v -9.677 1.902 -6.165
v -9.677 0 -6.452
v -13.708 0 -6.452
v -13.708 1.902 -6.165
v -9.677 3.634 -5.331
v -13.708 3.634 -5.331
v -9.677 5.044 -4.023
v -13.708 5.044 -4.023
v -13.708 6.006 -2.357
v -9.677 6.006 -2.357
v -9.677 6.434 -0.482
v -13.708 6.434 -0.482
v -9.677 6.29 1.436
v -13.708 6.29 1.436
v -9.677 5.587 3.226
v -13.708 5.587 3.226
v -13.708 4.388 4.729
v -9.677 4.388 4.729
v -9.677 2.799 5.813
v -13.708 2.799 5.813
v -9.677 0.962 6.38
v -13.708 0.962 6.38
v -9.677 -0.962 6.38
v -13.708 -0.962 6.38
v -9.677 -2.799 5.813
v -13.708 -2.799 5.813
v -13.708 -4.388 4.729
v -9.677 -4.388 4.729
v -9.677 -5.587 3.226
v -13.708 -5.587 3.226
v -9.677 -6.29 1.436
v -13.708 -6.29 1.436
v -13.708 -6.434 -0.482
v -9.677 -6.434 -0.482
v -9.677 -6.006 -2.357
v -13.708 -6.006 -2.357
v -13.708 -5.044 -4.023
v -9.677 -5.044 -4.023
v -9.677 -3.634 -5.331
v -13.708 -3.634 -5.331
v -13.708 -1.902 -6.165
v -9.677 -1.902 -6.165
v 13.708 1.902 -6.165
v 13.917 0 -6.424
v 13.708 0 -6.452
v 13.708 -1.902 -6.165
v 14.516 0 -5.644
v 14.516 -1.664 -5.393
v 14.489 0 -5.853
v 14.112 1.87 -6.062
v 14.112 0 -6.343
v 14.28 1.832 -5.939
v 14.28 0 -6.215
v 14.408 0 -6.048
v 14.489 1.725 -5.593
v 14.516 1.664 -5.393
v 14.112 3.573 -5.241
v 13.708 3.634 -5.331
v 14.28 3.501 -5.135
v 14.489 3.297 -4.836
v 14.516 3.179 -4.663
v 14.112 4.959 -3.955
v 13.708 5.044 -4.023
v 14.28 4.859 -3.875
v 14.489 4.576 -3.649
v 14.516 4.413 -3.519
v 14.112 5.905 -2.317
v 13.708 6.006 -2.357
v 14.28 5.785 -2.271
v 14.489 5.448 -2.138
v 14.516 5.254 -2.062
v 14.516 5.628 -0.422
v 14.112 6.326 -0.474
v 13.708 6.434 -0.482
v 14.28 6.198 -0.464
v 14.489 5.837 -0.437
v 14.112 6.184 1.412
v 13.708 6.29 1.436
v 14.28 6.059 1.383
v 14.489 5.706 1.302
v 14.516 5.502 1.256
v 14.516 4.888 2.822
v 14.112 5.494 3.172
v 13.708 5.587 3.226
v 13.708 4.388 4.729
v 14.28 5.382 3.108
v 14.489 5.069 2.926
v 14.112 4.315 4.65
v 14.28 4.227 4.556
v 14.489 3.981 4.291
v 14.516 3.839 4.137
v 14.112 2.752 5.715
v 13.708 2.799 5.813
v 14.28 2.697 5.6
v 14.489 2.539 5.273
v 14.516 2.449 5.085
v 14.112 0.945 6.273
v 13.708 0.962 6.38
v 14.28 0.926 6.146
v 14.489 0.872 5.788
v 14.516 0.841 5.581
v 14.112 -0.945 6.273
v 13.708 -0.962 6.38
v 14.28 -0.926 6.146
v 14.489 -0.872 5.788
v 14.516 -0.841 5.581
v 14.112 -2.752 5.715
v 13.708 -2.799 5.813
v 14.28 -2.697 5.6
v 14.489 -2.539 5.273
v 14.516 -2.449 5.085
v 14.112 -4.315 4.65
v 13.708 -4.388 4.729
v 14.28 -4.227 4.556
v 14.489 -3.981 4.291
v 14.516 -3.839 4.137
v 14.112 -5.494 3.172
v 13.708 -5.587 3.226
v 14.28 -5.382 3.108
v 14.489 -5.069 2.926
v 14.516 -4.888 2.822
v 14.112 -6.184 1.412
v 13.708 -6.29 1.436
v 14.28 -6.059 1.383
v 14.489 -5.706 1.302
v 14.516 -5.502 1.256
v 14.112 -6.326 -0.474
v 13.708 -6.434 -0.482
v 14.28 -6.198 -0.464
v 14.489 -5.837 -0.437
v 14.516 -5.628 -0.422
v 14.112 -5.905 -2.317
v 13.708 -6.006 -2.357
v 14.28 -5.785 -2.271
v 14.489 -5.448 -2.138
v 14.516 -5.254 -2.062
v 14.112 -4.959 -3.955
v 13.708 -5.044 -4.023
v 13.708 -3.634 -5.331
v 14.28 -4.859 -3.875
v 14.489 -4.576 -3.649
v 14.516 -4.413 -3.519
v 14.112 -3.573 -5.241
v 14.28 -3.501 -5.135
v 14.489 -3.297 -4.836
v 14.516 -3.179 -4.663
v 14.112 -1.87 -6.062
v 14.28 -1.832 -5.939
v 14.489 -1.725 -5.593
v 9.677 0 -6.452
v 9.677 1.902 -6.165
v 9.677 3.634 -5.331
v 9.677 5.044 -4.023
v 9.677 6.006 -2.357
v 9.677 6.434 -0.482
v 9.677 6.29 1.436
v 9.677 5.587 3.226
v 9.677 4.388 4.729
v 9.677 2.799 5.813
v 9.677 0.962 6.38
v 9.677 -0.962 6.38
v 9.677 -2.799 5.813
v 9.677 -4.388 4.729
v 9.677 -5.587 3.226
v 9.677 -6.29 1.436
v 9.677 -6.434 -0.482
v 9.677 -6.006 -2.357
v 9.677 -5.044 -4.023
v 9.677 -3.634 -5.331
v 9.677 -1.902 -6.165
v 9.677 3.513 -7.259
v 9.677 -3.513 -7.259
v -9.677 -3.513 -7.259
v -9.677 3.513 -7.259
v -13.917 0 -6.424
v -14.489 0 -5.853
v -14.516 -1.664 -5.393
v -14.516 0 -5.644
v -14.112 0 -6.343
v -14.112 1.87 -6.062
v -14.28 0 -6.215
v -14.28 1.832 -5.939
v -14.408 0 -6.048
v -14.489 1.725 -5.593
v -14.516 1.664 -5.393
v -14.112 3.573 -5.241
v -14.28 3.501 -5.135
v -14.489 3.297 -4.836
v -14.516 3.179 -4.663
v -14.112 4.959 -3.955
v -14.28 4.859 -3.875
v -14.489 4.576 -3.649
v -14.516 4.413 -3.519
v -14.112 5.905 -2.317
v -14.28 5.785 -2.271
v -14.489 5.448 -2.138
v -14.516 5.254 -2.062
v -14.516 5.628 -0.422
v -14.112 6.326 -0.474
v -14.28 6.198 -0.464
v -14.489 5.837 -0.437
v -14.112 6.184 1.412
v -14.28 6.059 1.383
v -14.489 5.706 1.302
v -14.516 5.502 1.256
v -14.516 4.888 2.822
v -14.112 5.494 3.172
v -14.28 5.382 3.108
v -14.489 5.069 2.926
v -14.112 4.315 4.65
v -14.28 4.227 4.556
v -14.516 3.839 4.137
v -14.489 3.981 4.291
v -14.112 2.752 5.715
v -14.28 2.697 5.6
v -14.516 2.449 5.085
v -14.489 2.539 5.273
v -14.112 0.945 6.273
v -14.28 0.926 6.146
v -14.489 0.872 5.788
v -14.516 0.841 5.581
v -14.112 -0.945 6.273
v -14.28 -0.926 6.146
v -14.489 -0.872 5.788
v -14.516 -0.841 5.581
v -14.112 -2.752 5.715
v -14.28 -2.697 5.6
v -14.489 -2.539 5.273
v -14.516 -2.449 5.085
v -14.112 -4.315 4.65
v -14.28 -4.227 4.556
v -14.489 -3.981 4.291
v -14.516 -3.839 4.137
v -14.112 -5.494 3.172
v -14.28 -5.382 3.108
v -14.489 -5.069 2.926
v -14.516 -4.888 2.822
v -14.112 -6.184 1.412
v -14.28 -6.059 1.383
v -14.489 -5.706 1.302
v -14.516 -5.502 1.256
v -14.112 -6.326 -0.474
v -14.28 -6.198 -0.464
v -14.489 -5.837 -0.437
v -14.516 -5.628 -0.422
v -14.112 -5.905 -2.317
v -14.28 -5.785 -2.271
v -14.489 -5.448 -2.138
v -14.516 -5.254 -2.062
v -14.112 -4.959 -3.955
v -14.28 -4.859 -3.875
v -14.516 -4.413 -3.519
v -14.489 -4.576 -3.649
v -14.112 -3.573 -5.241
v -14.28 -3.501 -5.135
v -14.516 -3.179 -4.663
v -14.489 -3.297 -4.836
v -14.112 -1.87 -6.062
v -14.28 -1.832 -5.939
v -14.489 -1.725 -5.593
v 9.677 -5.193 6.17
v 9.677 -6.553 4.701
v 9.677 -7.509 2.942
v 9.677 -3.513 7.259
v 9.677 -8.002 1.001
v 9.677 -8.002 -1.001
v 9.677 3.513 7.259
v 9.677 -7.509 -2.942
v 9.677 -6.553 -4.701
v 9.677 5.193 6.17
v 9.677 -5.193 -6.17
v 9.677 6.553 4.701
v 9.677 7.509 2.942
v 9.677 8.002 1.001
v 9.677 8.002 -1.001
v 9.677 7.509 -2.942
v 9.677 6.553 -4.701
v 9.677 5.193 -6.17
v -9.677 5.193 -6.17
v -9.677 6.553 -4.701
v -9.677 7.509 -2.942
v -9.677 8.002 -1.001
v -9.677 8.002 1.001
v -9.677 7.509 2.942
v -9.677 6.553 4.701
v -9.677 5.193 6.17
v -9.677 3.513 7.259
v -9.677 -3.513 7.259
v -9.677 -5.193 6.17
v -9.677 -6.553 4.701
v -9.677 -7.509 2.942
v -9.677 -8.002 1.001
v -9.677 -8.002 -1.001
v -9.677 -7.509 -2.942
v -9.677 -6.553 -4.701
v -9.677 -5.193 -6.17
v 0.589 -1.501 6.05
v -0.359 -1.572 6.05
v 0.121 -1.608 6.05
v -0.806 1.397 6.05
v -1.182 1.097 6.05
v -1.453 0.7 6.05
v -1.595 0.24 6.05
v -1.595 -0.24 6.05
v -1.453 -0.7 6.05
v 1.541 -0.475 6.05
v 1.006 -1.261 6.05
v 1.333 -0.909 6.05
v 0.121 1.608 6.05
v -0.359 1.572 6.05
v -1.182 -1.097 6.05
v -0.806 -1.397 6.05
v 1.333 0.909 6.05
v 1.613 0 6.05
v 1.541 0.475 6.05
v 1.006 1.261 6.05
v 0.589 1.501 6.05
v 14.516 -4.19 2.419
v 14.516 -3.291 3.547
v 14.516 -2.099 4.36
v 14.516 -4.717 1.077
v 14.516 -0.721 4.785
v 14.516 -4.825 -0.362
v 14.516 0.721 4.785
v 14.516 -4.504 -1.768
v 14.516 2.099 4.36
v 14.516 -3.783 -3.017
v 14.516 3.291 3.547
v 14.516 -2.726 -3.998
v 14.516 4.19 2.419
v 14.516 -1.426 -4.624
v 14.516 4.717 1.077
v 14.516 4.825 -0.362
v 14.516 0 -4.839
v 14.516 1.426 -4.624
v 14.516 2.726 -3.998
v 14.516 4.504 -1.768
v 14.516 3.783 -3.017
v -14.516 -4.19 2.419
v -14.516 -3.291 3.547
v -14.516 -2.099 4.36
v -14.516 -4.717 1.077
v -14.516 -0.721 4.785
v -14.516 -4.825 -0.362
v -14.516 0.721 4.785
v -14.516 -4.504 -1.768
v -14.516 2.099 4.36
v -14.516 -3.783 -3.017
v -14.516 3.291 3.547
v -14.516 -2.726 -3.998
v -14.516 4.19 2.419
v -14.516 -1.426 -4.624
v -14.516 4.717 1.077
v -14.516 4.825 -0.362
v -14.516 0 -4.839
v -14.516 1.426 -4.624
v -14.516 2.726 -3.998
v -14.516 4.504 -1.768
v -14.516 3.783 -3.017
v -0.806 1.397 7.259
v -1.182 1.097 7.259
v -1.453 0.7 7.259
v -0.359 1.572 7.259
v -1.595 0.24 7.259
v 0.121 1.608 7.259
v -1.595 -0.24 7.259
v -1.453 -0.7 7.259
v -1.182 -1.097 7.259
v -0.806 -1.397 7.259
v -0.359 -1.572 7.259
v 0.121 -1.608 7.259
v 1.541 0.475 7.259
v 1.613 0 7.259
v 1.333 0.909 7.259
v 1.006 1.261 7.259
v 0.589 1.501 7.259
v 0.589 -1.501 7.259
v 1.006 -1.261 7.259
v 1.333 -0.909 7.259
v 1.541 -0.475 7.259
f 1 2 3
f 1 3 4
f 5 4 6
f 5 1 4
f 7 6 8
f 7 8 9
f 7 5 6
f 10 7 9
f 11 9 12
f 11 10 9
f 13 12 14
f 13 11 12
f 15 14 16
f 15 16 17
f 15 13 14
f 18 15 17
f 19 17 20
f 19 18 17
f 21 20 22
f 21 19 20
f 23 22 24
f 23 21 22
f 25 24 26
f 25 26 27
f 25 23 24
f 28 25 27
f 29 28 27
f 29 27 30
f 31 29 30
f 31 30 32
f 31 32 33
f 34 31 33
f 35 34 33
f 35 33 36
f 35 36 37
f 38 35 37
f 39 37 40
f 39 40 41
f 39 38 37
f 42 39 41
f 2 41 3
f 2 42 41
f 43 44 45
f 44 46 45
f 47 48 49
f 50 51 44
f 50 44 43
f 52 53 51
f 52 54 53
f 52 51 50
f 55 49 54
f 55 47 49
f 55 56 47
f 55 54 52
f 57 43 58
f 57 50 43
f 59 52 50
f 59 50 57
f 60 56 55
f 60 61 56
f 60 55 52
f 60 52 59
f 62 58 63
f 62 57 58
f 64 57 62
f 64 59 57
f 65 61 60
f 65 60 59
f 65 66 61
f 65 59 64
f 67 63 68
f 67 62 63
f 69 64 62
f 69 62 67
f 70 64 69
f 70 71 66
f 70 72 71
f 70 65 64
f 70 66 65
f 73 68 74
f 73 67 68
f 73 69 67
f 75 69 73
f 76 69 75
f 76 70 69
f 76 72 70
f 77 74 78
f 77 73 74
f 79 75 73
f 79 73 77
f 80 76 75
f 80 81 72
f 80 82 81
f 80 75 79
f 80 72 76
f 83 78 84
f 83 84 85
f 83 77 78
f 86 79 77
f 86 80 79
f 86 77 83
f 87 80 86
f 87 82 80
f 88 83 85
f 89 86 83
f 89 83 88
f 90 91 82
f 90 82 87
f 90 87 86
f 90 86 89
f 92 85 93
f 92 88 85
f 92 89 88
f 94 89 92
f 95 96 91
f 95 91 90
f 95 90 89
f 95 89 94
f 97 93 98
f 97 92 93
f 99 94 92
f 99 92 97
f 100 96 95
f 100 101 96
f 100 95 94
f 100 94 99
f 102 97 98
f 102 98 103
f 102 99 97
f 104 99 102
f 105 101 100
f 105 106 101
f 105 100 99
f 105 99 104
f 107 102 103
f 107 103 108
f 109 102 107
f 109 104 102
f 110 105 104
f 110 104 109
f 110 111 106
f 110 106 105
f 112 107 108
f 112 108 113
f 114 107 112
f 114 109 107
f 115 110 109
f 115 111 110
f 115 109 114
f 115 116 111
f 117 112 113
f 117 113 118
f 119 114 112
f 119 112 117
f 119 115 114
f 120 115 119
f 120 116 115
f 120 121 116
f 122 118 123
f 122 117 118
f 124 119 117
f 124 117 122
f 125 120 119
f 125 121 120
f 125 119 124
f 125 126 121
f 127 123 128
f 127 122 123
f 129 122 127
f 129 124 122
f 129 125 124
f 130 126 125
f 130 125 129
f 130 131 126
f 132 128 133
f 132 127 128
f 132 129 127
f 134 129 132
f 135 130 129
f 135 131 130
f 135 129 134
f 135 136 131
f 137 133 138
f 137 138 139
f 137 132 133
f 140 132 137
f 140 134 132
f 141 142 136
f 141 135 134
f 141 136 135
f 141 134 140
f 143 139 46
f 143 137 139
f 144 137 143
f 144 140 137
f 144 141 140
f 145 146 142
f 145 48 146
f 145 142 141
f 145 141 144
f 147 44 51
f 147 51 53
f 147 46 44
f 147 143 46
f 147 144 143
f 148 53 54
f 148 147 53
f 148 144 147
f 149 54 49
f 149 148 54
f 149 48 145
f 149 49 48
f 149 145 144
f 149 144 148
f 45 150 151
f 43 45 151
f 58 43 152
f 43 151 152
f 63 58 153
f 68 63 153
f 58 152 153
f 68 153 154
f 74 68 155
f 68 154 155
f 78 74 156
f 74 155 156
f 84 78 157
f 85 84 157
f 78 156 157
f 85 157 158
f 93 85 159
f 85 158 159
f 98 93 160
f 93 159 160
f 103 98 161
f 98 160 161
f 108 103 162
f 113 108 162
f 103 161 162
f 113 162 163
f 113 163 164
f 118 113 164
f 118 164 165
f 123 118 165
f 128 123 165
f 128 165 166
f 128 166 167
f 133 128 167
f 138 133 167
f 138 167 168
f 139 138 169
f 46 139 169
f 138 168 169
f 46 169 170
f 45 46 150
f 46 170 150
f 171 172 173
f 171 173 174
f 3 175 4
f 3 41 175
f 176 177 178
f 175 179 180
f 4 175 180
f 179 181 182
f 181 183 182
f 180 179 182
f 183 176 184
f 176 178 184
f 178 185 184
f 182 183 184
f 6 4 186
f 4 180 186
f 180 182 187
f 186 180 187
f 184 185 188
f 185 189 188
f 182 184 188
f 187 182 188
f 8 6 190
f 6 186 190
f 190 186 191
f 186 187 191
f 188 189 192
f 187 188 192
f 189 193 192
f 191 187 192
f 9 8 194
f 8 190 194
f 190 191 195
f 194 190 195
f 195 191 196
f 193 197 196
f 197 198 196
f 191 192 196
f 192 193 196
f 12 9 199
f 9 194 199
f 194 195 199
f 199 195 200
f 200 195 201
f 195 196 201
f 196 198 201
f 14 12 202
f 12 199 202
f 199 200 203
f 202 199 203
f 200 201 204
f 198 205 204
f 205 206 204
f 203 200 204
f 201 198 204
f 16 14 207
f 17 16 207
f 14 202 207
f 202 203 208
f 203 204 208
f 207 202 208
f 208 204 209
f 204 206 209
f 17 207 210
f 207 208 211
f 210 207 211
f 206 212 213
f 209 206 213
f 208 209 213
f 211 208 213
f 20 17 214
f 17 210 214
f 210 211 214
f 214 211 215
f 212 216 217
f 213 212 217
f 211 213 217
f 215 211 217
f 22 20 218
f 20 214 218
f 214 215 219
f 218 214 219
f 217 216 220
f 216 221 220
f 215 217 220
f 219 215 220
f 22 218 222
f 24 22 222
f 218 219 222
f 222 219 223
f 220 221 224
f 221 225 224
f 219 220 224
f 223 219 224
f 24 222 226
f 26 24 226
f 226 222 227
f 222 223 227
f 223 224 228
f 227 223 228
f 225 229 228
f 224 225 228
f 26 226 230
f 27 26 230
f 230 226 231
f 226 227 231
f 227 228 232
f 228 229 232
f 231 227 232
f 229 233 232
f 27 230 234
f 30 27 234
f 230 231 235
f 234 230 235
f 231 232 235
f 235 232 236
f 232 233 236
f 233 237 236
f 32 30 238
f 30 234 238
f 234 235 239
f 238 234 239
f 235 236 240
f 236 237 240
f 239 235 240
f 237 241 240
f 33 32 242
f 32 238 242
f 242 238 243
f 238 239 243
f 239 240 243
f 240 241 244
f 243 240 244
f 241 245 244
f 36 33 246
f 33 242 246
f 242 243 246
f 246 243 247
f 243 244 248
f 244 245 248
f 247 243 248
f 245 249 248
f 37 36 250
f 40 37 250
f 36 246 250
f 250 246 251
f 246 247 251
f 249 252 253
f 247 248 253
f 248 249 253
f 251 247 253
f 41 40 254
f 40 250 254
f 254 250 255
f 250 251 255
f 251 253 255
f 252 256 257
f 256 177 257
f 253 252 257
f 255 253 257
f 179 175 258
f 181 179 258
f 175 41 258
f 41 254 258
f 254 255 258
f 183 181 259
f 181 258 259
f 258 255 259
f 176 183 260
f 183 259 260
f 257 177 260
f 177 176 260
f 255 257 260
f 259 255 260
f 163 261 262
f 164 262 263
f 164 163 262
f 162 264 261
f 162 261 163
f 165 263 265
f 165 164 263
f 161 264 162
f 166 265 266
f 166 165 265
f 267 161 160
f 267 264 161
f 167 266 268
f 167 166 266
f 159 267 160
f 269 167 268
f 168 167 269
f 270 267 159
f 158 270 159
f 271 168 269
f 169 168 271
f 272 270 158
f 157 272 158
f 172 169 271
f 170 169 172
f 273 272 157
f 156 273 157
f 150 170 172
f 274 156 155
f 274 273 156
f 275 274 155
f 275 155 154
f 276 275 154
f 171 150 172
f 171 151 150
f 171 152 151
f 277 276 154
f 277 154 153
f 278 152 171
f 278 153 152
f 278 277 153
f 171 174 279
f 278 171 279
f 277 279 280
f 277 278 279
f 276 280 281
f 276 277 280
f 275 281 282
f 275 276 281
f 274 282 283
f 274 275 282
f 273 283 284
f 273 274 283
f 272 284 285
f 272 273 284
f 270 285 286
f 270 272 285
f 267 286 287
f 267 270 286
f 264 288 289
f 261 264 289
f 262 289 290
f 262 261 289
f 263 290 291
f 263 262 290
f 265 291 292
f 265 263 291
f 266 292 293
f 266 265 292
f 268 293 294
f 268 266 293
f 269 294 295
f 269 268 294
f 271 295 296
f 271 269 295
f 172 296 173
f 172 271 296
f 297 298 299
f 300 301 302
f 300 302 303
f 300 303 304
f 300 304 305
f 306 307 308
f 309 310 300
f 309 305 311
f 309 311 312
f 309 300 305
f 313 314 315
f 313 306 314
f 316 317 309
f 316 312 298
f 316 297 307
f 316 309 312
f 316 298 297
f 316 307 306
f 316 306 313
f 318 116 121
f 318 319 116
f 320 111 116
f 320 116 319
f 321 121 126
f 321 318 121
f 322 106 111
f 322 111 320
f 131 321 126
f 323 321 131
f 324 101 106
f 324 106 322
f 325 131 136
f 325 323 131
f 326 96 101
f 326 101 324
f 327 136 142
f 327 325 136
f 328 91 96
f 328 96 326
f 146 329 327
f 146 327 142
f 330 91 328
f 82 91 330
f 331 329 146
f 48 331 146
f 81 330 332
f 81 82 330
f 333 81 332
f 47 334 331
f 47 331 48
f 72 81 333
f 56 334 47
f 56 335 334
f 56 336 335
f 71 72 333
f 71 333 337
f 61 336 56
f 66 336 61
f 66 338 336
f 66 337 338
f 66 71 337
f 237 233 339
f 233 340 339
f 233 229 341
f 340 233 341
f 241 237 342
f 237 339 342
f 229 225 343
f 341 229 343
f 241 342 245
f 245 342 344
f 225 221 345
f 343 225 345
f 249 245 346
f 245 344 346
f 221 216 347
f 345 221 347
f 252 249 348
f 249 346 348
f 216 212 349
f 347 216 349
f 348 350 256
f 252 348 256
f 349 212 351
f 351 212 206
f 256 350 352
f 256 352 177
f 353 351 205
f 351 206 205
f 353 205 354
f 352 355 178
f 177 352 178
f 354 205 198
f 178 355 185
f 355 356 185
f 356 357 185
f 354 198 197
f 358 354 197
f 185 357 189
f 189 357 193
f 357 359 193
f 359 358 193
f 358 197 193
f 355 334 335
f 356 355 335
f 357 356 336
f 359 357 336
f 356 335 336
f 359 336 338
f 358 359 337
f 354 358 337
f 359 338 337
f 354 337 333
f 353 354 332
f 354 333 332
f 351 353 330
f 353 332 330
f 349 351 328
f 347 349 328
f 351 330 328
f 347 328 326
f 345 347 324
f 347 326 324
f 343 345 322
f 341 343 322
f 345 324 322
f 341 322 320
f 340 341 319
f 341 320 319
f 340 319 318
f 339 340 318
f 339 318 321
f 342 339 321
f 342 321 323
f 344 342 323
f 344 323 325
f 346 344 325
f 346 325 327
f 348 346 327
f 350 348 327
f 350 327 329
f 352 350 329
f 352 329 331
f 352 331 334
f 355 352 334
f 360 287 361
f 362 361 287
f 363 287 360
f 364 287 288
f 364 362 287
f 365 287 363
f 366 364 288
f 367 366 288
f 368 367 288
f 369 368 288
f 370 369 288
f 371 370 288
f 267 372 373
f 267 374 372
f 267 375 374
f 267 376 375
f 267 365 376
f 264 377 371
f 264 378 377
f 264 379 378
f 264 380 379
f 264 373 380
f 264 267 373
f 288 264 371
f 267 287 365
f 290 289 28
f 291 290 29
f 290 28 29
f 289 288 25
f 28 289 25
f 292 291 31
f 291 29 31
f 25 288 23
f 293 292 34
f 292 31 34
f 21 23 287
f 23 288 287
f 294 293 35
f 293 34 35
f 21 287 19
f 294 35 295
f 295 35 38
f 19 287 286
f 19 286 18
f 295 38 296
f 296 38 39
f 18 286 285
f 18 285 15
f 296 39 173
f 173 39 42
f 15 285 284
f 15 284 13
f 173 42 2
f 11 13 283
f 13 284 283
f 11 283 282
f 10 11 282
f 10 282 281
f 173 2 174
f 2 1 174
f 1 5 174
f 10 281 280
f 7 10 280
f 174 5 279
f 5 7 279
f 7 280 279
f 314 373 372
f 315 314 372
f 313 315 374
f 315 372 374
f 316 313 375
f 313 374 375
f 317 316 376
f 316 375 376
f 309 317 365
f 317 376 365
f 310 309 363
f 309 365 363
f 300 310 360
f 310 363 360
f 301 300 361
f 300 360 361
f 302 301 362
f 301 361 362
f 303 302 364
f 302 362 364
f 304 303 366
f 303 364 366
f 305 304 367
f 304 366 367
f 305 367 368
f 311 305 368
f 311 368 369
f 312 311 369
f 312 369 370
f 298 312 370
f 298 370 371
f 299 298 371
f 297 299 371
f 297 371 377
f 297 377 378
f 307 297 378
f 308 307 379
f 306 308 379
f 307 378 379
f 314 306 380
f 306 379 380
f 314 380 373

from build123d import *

# Parameters (mm, degrees)
BOSS_EXTRUDE1_DEPTH      = 9.6774
BOSS_EXTRUDE1_DEPTH_BACK = 9.6774
SKETCH2_R                = 6.4516
BOSS_EXTRUDE2_DEPTH      = 4.8387
SKETCH3_R                = 4.8387
CUT_EXTRUDE1_DEPTH       = 30.0322
FILLET1_R                = 0.80772
SKETCH4_R                = 1.6129
CUT_EXTRUDE2_DEPTH       = 1.20904


with BuildPart() as part:
    # Sketch1 → Boss-Extrude1 (new body, two sides)
    with BuildSketch(Plane(origin=(0, 0, 0), x_dir=(0, 0, -1), z_dir=(1, 0, 0))) as boss_extrude1_sk:
        with BuildLine():
            Line((-7.25932, 3.512610623), (-7.25932, -3.512610623))
            ThreePointArc((-7.25932, -3.512610623), (0, -8.0645), (7.25932, -3.512610623))
            Line((7.25932, -3.512610623), (7.25932, 3.512610623))
            ThreePointArc((7.25932, 3.512610623), (0, 8.0645), (-7.25932, 3.512610623))
        make_face()
    extrude(amount=BOSS_EXTRUDE1_DEPTH)
    extrude(boss_extrude1_sk.sketch, amount=-BOSS_EXTRUDE1_DEPTH_BACK)

    # Sketch2 → Boss-Extrude2 (add)
    with BuildSketch(Plane(origin=(9.6774, 0, 0), x_dir=(0, 0, -1), z_dir=(1, 0, 0))):
        Circle(SKETCH2_R)
    boss_extrude2 = extrude(amount=BOSS_EXTRUDE2_DEPTH)

    # Mirror1: Boss-Extrude2 across plane
    add(boss_extrude2.mirror(Plane(origin=(0, 0, 0), x_dir=(0, 0, 1), z_dir=(1, 0, 0))))

    # Sketch3 → Cut-Extrude1 (cut, through all)
    with BuildSketch(Plane(origin=(14.5161, 0, 0), x_dir=(0, 0, -1), z_dir=(1, 0, 0))):
        Circle(SKETCH3_R)
    extrude(amount=-CUT_EXTRUDE1_DEPTH, mode=Mode.SUBTRACT)

    # Fillet1
    fillet1_edges = [part.edges().sort_by_distance(p)[0] for p in [
        (14.5161, 0, 6.4516),
        (-14.5161, 0, 6.4516),
    ]]
    fillet(fillet1_edges, radius=FILLET1_R)

    # Sketch4 → Cut-Extrude2 (cut)
    with BuildSketch(Plane.XY.offset(7.25932)):
        Circle(SKETCH4_R)
    extrude(amount=-CUT_EXTRUDE2_DEPTH, mode=Mode.SUBTRACT)


solid = part.part
